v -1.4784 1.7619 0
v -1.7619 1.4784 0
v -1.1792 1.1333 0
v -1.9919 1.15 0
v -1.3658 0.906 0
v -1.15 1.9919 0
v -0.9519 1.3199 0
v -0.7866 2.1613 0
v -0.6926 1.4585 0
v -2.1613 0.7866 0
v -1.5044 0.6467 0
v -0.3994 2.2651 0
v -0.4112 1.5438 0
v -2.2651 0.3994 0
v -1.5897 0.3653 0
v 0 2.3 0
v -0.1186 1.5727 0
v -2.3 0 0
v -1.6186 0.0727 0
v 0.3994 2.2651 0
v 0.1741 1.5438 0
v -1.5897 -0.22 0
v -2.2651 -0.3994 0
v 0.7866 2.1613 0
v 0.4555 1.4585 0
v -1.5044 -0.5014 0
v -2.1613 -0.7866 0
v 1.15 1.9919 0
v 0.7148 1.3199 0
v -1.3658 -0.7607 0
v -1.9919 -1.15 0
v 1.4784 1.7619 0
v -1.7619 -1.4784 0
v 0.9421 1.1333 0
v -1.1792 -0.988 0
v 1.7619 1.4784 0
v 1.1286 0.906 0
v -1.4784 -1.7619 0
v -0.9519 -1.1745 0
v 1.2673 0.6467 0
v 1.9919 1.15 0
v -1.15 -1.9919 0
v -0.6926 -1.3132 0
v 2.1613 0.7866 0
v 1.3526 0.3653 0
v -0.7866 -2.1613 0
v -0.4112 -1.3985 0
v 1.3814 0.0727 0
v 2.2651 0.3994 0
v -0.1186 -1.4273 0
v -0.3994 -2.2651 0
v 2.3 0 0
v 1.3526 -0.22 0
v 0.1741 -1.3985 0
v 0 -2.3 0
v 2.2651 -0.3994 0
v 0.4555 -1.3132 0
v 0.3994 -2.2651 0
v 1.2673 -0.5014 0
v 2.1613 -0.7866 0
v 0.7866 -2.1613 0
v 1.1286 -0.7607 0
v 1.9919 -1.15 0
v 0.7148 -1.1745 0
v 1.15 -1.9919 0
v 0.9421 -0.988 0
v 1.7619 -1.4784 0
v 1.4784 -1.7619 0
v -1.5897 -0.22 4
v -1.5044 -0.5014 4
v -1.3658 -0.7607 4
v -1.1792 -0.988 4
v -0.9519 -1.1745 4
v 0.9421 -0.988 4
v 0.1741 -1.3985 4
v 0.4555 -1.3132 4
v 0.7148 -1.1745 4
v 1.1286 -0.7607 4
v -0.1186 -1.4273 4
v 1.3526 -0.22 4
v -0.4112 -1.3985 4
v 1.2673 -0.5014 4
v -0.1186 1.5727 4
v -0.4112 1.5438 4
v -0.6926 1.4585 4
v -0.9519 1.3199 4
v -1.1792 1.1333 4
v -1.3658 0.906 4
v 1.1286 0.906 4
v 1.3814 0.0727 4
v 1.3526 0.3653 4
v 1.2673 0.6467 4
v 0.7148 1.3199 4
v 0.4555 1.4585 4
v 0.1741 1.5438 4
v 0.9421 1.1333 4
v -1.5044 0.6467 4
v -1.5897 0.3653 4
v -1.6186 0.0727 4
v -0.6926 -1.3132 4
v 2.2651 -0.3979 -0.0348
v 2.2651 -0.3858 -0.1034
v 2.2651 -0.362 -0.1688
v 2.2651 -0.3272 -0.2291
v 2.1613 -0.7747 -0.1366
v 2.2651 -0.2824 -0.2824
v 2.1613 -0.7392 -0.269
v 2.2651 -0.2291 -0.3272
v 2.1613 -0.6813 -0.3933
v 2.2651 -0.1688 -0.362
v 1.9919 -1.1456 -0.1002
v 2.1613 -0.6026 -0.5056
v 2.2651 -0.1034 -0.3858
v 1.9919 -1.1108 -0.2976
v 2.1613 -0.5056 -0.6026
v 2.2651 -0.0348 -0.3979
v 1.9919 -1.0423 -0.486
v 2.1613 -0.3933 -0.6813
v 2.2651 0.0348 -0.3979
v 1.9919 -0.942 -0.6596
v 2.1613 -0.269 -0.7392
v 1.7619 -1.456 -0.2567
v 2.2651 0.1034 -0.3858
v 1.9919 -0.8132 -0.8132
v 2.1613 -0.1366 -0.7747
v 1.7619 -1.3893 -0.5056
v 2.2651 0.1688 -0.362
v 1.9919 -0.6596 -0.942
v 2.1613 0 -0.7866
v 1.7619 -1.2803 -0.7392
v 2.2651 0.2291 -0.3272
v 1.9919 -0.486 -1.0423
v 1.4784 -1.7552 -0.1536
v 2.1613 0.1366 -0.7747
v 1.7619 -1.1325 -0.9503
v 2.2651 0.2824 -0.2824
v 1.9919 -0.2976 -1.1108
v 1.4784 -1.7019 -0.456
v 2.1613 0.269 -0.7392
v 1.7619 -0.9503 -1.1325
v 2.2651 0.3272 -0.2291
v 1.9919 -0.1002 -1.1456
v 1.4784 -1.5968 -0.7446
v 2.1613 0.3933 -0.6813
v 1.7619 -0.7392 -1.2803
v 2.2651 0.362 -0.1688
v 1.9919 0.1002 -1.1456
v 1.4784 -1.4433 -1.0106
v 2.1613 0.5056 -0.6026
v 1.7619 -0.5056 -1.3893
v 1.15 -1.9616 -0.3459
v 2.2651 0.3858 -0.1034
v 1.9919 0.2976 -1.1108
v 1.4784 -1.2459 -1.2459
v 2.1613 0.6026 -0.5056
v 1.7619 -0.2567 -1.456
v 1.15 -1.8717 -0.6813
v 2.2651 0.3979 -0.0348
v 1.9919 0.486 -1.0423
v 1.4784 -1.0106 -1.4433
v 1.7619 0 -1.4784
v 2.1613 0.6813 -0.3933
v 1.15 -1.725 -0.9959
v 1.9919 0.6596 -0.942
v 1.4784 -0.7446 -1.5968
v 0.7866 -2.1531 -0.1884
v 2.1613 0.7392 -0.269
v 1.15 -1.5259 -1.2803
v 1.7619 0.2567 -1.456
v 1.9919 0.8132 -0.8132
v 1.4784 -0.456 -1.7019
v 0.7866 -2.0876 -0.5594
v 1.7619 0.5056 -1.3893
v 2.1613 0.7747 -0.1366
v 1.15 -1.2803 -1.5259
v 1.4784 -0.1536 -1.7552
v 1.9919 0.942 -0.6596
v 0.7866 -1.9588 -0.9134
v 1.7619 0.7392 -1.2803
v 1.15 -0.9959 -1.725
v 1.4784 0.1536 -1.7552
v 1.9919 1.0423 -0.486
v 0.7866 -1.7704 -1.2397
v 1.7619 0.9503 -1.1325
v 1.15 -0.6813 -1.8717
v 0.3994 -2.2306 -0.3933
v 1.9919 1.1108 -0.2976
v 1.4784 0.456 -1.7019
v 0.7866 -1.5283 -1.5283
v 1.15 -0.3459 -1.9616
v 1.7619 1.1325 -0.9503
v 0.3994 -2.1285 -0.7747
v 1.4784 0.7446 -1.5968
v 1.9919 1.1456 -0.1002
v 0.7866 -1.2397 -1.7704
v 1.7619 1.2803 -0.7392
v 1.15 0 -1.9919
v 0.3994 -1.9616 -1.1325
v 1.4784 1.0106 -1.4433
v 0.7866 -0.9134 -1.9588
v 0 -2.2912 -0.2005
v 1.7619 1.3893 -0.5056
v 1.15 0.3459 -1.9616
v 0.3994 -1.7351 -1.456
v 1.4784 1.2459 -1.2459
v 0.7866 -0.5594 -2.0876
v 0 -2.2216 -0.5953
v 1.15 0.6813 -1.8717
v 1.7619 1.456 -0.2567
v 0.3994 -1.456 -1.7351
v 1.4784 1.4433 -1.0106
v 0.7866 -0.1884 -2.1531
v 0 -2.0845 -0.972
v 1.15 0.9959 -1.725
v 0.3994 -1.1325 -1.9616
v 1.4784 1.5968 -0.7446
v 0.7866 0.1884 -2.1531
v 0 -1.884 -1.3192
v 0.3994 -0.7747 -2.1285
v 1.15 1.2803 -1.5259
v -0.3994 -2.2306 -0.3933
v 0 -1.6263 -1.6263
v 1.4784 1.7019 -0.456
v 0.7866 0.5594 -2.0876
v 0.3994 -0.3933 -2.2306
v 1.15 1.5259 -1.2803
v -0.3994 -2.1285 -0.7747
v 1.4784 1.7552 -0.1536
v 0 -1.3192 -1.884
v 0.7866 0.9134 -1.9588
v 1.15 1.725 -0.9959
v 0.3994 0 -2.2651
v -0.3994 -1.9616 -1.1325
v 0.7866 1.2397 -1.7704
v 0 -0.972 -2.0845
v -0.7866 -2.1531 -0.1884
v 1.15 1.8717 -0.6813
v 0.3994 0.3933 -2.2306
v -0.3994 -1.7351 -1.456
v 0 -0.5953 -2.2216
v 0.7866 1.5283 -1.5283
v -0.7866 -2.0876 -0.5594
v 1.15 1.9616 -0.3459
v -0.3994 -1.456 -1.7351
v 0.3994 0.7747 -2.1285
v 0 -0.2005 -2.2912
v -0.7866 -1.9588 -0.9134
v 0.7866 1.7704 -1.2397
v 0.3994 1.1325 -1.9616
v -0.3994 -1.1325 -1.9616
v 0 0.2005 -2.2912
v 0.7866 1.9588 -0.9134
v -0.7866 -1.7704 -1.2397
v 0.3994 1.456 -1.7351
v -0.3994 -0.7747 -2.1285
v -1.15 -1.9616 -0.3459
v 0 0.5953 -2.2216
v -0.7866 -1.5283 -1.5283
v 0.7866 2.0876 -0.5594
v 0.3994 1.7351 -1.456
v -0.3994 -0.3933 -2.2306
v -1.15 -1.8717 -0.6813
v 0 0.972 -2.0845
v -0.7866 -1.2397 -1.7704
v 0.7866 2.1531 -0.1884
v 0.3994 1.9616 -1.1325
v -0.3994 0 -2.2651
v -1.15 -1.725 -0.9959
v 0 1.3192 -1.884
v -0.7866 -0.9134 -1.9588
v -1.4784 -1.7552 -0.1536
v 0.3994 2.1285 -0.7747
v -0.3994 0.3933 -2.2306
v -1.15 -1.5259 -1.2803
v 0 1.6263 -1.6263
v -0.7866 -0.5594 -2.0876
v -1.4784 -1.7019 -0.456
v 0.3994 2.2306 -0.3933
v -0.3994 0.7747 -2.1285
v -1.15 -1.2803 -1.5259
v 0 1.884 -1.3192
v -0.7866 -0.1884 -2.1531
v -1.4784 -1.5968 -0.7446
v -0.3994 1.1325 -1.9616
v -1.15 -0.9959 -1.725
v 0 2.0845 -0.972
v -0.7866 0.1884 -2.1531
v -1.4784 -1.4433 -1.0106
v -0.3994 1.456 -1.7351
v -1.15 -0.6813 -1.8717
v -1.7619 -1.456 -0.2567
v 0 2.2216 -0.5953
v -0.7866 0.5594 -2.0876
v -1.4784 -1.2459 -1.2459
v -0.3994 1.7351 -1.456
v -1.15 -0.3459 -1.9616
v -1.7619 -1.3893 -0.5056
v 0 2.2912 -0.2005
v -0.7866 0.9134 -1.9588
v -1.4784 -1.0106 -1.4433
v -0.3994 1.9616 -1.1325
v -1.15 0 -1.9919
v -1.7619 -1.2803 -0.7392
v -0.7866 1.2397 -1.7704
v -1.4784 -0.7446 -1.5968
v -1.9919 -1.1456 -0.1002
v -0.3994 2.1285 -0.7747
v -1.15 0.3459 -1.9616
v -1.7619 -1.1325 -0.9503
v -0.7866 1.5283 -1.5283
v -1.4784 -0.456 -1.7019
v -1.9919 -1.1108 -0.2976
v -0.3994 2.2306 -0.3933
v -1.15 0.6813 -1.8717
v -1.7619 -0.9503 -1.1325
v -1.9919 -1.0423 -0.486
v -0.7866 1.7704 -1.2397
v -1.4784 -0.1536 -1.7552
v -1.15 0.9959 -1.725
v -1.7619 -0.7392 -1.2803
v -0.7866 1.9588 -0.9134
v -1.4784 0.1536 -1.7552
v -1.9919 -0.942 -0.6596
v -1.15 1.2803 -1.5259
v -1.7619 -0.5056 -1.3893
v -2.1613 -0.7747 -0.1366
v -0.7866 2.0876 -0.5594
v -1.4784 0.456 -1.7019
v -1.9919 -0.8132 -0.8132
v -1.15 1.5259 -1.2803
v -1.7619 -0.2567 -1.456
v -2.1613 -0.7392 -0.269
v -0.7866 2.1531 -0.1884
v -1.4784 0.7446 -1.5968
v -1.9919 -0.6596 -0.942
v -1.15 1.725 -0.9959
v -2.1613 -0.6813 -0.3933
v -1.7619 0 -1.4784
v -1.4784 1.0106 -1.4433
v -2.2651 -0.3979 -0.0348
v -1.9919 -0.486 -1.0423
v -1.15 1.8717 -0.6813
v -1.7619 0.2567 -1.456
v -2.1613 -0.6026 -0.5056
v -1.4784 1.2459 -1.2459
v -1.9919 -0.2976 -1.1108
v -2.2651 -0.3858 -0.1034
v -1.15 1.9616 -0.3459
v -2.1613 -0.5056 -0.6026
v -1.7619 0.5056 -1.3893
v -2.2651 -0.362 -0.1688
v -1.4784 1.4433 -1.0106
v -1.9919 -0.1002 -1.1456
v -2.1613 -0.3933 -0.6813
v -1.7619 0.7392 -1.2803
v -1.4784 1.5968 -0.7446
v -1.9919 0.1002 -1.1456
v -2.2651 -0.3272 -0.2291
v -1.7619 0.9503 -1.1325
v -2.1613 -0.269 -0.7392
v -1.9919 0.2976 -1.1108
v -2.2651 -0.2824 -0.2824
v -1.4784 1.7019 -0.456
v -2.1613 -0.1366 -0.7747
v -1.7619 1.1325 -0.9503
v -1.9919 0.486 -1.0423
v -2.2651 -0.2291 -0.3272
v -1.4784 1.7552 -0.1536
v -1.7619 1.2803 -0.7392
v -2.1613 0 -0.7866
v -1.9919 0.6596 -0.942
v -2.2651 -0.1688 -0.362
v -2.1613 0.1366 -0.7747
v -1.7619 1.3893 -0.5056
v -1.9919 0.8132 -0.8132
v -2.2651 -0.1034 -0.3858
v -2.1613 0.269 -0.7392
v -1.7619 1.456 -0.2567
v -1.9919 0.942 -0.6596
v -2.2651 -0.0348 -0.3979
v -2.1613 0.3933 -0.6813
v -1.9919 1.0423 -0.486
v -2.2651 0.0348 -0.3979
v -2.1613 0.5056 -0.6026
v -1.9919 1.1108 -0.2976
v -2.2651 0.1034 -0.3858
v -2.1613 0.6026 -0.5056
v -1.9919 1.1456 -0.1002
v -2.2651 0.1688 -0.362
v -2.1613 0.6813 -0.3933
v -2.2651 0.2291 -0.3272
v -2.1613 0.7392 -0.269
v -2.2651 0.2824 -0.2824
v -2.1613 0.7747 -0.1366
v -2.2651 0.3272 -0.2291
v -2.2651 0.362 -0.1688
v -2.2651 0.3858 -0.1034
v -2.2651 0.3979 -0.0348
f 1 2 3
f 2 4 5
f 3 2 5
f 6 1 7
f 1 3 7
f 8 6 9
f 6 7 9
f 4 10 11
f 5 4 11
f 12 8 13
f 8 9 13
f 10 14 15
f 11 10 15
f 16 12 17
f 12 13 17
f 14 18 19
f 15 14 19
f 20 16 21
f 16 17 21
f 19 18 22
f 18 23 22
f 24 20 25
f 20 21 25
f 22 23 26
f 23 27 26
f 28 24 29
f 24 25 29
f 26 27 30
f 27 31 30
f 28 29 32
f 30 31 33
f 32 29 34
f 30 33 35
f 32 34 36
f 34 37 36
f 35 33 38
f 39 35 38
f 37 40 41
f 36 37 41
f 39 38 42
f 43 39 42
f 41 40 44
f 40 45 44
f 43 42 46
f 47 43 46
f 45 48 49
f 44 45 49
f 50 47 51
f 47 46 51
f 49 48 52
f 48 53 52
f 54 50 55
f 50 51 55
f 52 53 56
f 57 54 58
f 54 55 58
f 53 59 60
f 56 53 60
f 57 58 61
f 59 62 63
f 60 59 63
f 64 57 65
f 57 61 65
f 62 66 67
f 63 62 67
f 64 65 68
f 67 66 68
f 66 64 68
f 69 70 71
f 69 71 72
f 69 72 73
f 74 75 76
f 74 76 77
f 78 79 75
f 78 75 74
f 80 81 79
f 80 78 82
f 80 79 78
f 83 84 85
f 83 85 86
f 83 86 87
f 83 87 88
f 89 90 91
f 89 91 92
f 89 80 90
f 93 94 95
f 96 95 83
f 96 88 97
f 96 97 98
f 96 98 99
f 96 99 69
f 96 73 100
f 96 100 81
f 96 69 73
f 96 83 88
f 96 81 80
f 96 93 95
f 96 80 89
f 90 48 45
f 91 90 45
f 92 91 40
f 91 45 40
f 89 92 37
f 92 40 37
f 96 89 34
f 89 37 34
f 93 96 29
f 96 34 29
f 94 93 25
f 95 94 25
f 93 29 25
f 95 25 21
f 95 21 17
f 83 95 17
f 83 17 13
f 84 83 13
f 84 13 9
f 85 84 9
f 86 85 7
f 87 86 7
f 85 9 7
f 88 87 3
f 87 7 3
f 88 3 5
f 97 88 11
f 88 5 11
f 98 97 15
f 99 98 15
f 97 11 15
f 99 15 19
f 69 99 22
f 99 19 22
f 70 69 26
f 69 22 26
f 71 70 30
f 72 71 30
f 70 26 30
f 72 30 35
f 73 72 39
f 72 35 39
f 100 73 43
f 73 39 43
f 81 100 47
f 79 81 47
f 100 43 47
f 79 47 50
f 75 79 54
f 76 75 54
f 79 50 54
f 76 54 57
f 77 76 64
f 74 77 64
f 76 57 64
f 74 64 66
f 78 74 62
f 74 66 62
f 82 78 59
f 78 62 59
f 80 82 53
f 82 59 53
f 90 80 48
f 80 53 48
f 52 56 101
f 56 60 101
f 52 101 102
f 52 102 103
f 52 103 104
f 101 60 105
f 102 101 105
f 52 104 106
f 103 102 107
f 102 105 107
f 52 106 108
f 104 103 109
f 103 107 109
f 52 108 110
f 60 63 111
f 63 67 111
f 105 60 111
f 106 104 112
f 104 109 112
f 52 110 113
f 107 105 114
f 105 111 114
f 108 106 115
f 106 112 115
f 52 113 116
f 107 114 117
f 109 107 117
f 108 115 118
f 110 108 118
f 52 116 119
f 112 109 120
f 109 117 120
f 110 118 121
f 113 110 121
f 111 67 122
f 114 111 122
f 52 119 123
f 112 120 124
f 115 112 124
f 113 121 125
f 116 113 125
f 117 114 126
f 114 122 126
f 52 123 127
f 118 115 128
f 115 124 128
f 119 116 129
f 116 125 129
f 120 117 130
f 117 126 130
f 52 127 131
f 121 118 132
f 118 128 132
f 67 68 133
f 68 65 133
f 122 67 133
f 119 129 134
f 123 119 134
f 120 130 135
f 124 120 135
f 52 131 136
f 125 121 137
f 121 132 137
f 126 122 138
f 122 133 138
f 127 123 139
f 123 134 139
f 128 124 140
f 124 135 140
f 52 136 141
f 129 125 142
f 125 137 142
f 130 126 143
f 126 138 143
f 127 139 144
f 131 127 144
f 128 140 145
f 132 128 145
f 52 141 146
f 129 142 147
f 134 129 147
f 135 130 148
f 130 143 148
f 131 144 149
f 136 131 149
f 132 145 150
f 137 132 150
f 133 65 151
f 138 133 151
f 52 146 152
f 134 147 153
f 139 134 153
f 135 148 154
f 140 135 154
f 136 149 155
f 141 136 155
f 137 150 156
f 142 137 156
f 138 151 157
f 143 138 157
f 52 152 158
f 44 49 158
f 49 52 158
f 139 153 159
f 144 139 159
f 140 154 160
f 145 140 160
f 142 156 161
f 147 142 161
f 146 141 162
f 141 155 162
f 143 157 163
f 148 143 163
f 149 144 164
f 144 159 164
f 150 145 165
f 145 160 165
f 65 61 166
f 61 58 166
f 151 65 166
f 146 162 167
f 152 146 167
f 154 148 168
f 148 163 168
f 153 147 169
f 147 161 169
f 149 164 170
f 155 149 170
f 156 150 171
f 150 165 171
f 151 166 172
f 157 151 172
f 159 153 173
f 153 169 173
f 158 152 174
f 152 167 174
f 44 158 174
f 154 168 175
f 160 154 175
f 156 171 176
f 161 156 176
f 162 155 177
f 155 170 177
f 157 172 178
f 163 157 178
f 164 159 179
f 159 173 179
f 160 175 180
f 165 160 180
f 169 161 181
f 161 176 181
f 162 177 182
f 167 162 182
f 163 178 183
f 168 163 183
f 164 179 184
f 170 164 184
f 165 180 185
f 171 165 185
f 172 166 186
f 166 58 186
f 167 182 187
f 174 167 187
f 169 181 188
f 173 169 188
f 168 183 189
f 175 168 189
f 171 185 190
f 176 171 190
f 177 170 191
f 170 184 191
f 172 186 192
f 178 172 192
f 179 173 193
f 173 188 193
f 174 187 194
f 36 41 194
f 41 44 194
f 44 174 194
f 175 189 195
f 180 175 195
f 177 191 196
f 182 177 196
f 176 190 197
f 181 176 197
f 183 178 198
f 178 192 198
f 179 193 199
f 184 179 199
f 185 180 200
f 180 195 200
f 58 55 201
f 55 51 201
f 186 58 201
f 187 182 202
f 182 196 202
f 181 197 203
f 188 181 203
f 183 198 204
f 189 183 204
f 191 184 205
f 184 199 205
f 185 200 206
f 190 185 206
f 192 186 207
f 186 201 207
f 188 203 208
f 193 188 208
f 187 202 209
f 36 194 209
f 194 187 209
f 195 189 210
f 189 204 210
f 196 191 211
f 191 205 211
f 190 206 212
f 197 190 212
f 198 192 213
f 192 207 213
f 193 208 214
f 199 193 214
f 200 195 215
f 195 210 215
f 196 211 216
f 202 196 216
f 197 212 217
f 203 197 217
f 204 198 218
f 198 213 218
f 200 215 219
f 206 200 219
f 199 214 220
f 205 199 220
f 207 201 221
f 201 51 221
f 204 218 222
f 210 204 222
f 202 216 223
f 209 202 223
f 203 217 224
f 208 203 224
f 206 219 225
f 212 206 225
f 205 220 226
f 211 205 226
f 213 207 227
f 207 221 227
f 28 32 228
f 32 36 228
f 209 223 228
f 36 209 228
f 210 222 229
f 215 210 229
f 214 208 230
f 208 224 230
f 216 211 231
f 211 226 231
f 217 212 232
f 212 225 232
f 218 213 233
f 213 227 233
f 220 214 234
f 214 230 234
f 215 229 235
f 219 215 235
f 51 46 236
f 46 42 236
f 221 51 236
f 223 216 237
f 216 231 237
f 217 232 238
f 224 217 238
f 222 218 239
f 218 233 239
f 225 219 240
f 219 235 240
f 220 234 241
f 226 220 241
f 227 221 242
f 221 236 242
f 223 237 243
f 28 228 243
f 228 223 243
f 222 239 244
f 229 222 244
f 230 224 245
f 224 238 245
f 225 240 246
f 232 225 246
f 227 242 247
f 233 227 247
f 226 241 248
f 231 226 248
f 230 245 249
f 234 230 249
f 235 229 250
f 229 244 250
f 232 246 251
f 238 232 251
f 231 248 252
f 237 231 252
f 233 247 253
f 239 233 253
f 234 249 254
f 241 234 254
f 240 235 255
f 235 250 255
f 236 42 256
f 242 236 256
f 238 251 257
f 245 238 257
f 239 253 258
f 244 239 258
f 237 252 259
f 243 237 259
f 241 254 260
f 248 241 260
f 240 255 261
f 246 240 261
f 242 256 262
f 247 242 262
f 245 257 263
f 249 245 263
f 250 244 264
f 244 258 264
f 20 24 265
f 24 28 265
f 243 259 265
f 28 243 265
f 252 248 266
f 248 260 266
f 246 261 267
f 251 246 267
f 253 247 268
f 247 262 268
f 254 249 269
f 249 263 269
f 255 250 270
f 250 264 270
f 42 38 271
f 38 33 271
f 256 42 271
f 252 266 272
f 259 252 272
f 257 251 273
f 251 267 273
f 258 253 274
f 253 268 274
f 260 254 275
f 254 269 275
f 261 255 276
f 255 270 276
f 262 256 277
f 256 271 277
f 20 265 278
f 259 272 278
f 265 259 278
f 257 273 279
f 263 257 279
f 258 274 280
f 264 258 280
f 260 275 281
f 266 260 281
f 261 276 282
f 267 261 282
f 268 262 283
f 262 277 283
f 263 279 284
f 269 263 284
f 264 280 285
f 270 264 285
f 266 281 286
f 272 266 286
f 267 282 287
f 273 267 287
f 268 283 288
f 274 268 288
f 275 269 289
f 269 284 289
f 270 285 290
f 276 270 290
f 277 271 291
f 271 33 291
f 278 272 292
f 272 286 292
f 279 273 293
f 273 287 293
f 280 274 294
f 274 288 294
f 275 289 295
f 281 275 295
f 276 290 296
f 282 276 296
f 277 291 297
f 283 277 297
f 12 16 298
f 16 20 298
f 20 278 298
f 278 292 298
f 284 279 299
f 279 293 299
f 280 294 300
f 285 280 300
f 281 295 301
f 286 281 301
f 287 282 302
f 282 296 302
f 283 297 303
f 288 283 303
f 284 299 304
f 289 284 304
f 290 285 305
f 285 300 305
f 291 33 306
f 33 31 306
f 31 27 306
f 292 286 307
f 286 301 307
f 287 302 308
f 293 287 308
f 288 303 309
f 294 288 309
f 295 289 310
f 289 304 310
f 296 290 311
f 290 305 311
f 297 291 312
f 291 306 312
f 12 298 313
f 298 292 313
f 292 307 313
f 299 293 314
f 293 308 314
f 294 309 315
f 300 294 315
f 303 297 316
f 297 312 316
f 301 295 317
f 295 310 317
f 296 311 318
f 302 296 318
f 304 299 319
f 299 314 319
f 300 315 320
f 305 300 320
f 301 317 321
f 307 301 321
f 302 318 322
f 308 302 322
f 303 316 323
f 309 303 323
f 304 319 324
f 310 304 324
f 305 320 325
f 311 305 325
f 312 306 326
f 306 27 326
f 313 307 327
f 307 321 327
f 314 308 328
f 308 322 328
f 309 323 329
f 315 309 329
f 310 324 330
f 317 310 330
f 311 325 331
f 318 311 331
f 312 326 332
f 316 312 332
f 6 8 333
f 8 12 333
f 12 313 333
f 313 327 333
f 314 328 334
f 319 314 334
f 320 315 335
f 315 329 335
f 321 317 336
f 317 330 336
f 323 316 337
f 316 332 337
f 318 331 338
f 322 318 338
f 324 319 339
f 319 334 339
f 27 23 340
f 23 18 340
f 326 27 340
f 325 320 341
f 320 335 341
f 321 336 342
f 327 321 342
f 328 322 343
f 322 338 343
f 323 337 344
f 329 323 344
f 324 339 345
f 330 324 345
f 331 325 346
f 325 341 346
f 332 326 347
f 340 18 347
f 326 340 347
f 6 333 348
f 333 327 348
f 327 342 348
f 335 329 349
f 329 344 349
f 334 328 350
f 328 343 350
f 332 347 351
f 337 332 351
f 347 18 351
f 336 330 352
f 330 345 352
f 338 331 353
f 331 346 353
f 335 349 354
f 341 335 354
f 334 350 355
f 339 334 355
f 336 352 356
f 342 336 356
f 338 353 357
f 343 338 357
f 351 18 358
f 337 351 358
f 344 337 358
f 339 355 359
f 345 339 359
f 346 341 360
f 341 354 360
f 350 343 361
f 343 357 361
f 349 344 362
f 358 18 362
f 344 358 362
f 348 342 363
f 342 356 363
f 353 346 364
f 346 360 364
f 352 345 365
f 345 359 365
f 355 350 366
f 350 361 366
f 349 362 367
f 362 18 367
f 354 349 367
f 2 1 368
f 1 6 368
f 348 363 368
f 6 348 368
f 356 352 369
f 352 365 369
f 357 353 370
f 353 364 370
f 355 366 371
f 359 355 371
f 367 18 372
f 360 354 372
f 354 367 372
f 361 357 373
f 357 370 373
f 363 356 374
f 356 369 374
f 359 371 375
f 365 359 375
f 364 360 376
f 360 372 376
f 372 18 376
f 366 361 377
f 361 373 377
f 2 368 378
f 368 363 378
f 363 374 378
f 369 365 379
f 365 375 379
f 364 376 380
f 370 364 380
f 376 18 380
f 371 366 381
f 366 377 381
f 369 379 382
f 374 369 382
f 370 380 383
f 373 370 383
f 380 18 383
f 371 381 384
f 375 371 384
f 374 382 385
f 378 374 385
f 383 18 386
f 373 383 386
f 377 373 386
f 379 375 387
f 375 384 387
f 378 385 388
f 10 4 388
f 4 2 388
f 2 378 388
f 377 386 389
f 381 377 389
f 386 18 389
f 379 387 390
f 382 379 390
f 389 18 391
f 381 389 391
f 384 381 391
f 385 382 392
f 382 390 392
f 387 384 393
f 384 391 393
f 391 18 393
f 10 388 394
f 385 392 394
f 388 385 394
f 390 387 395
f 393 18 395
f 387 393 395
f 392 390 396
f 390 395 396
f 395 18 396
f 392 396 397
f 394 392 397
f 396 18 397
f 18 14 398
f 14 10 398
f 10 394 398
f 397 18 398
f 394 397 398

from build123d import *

# Parameters (mm, degrees)
F3_W     = 10
F3_H     = 4.6456689391
F4_DEPTH = 25
F5_R     = 1.5
F6_DEPTH = 4


with BuildPart() as f1:
    # F0 (on Front) → F1 (revolve)
    with BuildSketch(Plane.XZ):
        with BuildLine():
            Line((-2.3, 0), (2.3, 0))
            ThreePointArc((2.3, 0), (0, 2.3), (-2.3, 0))
        make_face()
    revolve(axis=Axis((0, 0, 0), (1, 0, 0)))

    # F3 (on offset) → F4 (cut)
    with BuildSketch(Plane.XZ.offset(10)):
        with Locations((0.6477613404, 2.3228344696)):
            Rectangle(F3_W, F3_H)
    extrude(amount=-F4_DEPTH, mode=Mode.SUBTRACT)

    # F5 (on face) → F6 (join)
    with BuildSketch(Plane.XY):
        with Locations((-0.1185681322, 0.0726561921)):
            Circle(F5_R)
    extrude(amount=F6_DEPTH)


solid = f1.part
